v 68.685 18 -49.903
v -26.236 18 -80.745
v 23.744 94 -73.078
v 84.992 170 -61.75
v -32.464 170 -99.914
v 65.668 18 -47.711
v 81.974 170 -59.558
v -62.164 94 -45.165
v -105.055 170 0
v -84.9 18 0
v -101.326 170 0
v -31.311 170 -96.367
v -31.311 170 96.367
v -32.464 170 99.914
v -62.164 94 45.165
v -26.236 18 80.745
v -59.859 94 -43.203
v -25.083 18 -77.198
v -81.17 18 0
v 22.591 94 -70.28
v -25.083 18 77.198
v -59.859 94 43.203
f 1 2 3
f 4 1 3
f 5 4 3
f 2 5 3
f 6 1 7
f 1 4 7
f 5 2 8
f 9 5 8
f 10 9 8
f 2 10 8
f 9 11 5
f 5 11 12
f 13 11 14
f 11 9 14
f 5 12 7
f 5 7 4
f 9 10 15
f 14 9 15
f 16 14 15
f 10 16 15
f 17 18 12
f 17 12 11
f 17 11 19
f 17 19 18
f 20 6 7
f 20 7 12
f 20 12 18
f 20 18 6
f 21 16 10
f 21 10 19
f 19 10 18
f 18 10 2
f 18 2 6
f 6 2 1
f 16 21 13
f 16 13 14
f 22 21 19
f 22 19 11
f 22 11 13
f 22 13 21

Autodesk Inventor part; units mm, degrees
sketch "草图1" plane through (0, 0, 0) normal (0, 1, 0) x (-1, 0, 0)
  line L0 (82.5131, 0) -> (25.498, -78.4746)
  line L1 (25.498, -78.4746) -> (-66.7545, -48.5)
  line L2 (-66.7545, -48.5) -> (-66.7545, 48.5)
  line L3 (-66.7545, 48.5) -> (25.498, 78.4746)
  line L4 (25.498, 78.4746) -> (82.5131, 0)
  point P0 (0, 0)
  point P1 (0, 0)
  dimension "d0" = 97
ref_plane "工作平面1" through (0, 170, 0) normal (0, 1, 0) x (-1, 0, 0)
sketch "草图2" plane through (0, 170, 0) normal (0, 1, 0) x (-1, 0, 0)
  line L0 (105.0554, 0) -> (32.4639, -99.9136)
  line L1 (32.4639, -99.9136) -> (-84.9916, -61.75)
  line L2 (-84.9916, -61.75) -> (-84.9916, 61.75)
  line L3 (-84.9916, 61.75) -> (32.4639, 99.9136)
  line L4 (32.4639, 99.9136) -> (105.0554, 0)
  point P0 (0, 0)
  point P1 (0, 0)
  dimension "d2" = 123.5
loft "放样1" add profiles "草图2", "草图1"
sketch "草图3" plane through (84.9916, 170, 61.75) normal (0, 1, 0) x (1, 0, 0)
  line L0 (-153.2988, 61.75) -> (-106.0997, 126.7141)
  line L1 (-106.0997, 126.7141) -> (-29.7298, 101.9)
  line L2 (-29.7298, 101.9) -> (-29.7298, 21.6)
  line L3 (-29.7298, 21.6) -> (-106.0997, -3.2141)
  line L4 (-106.0997, -3.2141) -> (-153.2988, 61.75)
  point P0 (-84.9916, 61.75)
  point P1 (-84.9916, 61.75)
  dimension "d7" = 80.3
extrude "拉伸1" cut sketch "草图3" against normal blind 164
shell "抽壳1" thickness 3 removed faces 1 at (10.4732, 170, -75.5426)
sketch "草图5" plane through (66.7545, 0, -48.5) normal (0, -1, 0) x (1, 0, 0)
  line L0 (-98.0659, 144.8667) -> (-91.2229, 123.806) projected
  line L1 (-106.5917, 71.5) -> (-123.9122, 81.5)
  line L2 (-107.7408, 69.3836) -> (-125.561, 78.4634)
  arc A0 (-106.5917, 71.5) -> (-107.7408, 69.3836) centre (-66.7545, 48.5) ccw
  arc A1 (-123.9122, 81.5) -> (-125.561, 78.4634) centre (-66.7545, 48.5) ccw
  point P0 (-99.2814, 81.0269)
  dimension "d37" = 132
  dimension "d38" = 92
  dimension "d40" = 3
extrude "拉伸2" add sketch "草图5" along normal blind 3
sketch "草图7" plane through (66.7545, -3, -48.5) normal (0, -1, 0) x (1, 0, 0)
  arc A0 (-100.9392, 79.28) -> (-106.5917, 71.5) centre (-66.7545, 48.5) ccw
  arc A1 (-115.8021, 92.6626) -> (-125.561, 78.4634) centre (-66.7545, 48.5) ccw
  arc A2 (-100.9392, 79.28) -> (-107.7408, 69.3836) centre (-66.7545, 48.5) ccw
  line L0 (-100.9392, 79.28) -> (-115.8021, 92.6626)
  line L1 (-125.561, 78.4634) -> (-107.7408, 69.3836) projected
  line L2 (-107.7408, 69.3836) -> (-125.561, 78.4634)
  dimension "d25" = 92
  dimension "d41" = 15
extrude "拉伸3" add sketch "草图7" along normal blind 3
chamfer "倒角1" distance 1 angle 45 1 edges at (-41.6161, -3, 37.4713)
sketch "草图8" plane through (66.7545, 0, -48.5) normal (0, -1, 0) x (1, 0, 0)
  circle A0 centre (-66.7545, 48.5) radius 15
  dimension "d100" = 30
extrude "拉伸4" add sketch "草图8" along normal blind 30
pattern_circular "环形阵列1" count 10 over 360 about axis through (0, -10, 0) along (0, 1, 0) of "拉伸3", "拉伸2", "倒角1"
sketch "草图9" plane through (64.0591, 3, 46.5417) normal (0, 1, 0) x (1, 0, 0)
  line L0 (-132.3664, 46.5417) -> (-85.1672, 111.5058) projected
  line L1 (-85.1672, -18.4224) -> (-132.3664, 46.5417) projected
  line L2 (-8.7974, 6.3917) -> (-85.1672, -18.4224) projected
  line L3 (-8.7974, 86.6917) -> (-8.7974, 6.3917) projected
  line L4 (-85.1672, 111.5058) -> (-8.7974, 86.6917) projected
  line L5 (-136.0746, 46.5417) -> (-86.3131, -21.9491) projected
  line L6 (-86.3131, -21.9491) -> (-5.7974, 4.2121) projected
  line L7 (-5.7974, 4.2121) -> (-5.7974, 88.8713) projected
  line L8 (-5.7974, 88.8713) -> (-86.3131, 115.0325) projected
  line L9 (-86.3131, 115.0325) -> (-136.0746, 46.5417) projected
  line L10 (-85.1672, -18.4224) -> (-132.3664, 46.5417) projected
  line L11 (-132.3664, 46.5417) -> (-85.1672, 111.5058) projected
  line L12 (-85.1672, 111.5058) -> (-8.7974, 86.6917) projected
  line L13 (-8.7974, 86.6917) -> (-8.7974, 6.3917) projected
  line L14 (-8.7974, 6.3917) -> (-85.1672, -18.4224) projected
  line L15 (-143.2406, 46.5417) -> (-88.5276, 121.8477) projected
  line L16 (-88.5276, -28.7643) -> (-143.2406, 46.5417) projected
  line L17 (0, 0) -> (-88.5276, -28.7643) projected
  line L18 (0, 93.0834) -> (0, 0) projected
  line L19 (-88.5276, 121.8477) -> (0, 93.0834) projected
  line L20 (-145.4076, 46.5417) -> (-89.1972, 123.9087)
  line L21 (-89.1972, 123.9087) -> (1.7532, 94.3571)
  line L22 (1.7532, 94.3571) -> (1.7532, -1.2738)
  line L23 (1.7532, -1.2738) -> (-89.1972, -30.8253)
  line L24 (-89.1972, -30.8253) -> (-145.4076, 46.5417)
  point P0 (-64.0591, 46.5417)
extrude "拉伸5" add sketch "草图9" along normal blind 15 contours L15 L19 L18 L17 L16 | L20 L21 L22 L23 L24
sketch "草图10" plane through (84.9916, 6, 61.75) normal (0, 1, 0) x (1, 0, 0)
  line L0 (-153.2988, 61.75) -> (-106.0997, 126.7141) projected
  line L1 (-106.0997, -3.2141) -> (-153.2988, 61.75) projected
  line L2 (-29.7298, 21.6) -> (-106.0997, -3.2141) projected
  line L3 (-29.7298, 101.9) -> (-29.7298, 21.6) projected
  line L4 (-106.0997, 126.7141) -> (-29.7298, 101.9) projected
  line L5 (-107.2456, 130.2408) -> (-157.007, 61.75) projected
  line L6 (-26.7298, 104.0796) -> (-107.2456, 130.2408) projected
  line L7 (-26.7298, 19.4204) -> (-26.7298, 104.0796) projected
  line L8 (-107.2456, -6.7408) -> (-26.7298, 19.4204) projected
  line L9 (-157.007, 61.75) -> (-107.2456, -6.7408) projected
  line L10 (-166.1621, 61.75) -> (-110.0746, 138.9477) projected
  line L11 (-110.0746, -15.4477) -> (-166.1621, 61.75) projected
  line L12 (-19.3233, 14.0392) -> (-110.0746, -15.4477) projected
  line L13 (-19.3233, 109.4608) -> (-19.3233, 14.0392) projected
  line L14 (-110.0746, 138.9477) -> (-19.3233, 109.4608) projected
  point P0 (-84.9916, 61.75)
sketch "草图11" plane through (64.0591, 18, 46.5417) normal (0, 1, 0) x (1, 0, 0)
  line L0 (-64.0591, 46.5417) -> (2.6954, 46.5417) construction
  line L1 (-86.3131, 115.0325) -> (-136.0746, 46.5417) projected
  line L2 (-5.7974, 88.8713) -> (-86.3131, 115.0325) projected
  line L3 (-5.7974, 4.2121) -> (-5.7974, 88.8713) projected
  line L4 (-86.3131, -21.9491) -> (-5.7974, 4.2121) projected
  line L5 (-136.0746, 46.5417) -> (-86.3131, -21.9491) projected
  line L6 (-145.2296, 46.5417) -> (-89.1422, 123.7394) projected
  line L7 (-89.1422, -30.656) -> (-145.2296, 46.5417) projected
  line L8 (1.6092, -1.1691) -> (-89.1422, -30.656) projected
  line L9 (1.6092, 94.2525) -> (1.6092, -1.1691) projected
  line L10 (-89.1422, 123.7394) -> (1.6092, 94.2525) projected
  circle A0 centre (-2.0908, 11.2121) radius 1.25
  line L11 (-5.7974, 4.2121) -> (1.6092, -1.1691) construction
  line L12 (-5.7974, 4.2121) -> (-5.7974, 88.8713) projected
  line L13 (-86.3131, -21.9491) -> (-5.7974, 4.2121) projected
  line L14 (1.6092, -1.1691) -> (-89.1422, -30.656) projected
  line L15 (1.6092, 94.2525) -> (1.6092, -1.1691) projected
  circle A1 centre (-11.3094, -1.4762) radius 1.25
  line L16 (-2.0941, 7.5215) -> (-0.5941, 7.5215)
  line L17 (-0.5941, 7.5215) -> (-0.5941, 0.4317)
  line L18 (-2.0941, 7.5215) -> (-3.5941, 7.5215)
  line L19 (-3.5941, 7.5215) -> (-3.5941, 2.6113)
  line L20 (-7.8005, -0.3326) -> (-7.3369, -1.7592)
  line L21 (-7.3369, -1.7592) -> (-0.5941, 0.4317)
  line L22 (-7.8005, -0.3326) -> (-8.264, 1.094)
  line L23 (-8.264, 1.094) -> (-3.5941, 2.6113)
  dimension "d63" = 2.5
  dimension "d69" = 3.7
  dimension "d131" = 3.6906
extrude "拉伸7" cut sketch "草图11" against normal blind 3 contours A0 | A1 | L16 L17 L21 L20 L22 L23 L19 L18
extrude "拉伸8" add sketch "草图10" along normal blind 10 and the other way blind 3 contours L10 L14 L13 L12 L11
extrude "拉伸9" cut sketch "草图10" along normal blind 10 and the other way blind 3 contours L10 L14 L13 L12 L11
ref_plane "工作平面2" through (84.9916, 7, 61.75) normal (0, 1, 0) x (1, 0, 0)
sketch "草图12" plane through (84.9916, 7, 61.75) normal (0, 1, 0) x (1, 0, 0)
  line L0 (-107.2456, -6.7408) -> (-26.7298, 19.4204) projected
  line L1 (-60.7054, 8.3811) -> (-61.6324, 11.2342)
  line L2 (-29.7298, 21.6) -> (-106.0997, -3.2141) projected
  line L3 (-89.8404, 2.0689) -> (-88.9133, -0.7843)
  line L4 (-107.2456, -6.7408) -> (-26.7298, 19.4204) projected
  line L5 (-29.7298, 21.6) -> (-106.0997, -3.2141) projected
  line L6 (-63.5345, 10.6162) -> (-62.6075, 7.763)
  line L7 (-65.4366, 9.9982) -> (-64.5096, 7.145)
  line L8 (-67.3388, 9.3801) -> (-66.4117, 6.527)
  line L9 (-69.2409, 8.7621) -> (-68.3138, 5.9089)
  line L10 (-71.143, 8.1441) -> (-70.2159, 5.2909)
  line L11 (-73.0451, 7.526) -> (-72.118, 4.6729)
  line L12 (-74.9472, 6.908) -> (-74.0202, 4.0548)
  line L13 (-76.7905, 6.3091) -> (-75.7638, 3.4883)
  line L14 (-84.134, 3.923) -> (-83.207, 1.0698)
  line L15 (-86.0362, 3.305) -> (-85.1091, 0.4518)
  line L16 (-87.9383, 2.6869) -> (-87.0112, -0.1662)
  line L17 (-80.3298, 5.1591) -> (-79.4028, 2.3059)
  line L18 (-82.2319, 4.541) -> (-81.3049, 1.6879)
  line L19 (-78.4277, 5.7771) -> (-77.5006, 2.9239)
  line L20 (-61.6324, 11.2342) -> (-63.5345, 10.6162)
  line L21 (-62.6075, 7.763) -> (-60.7054, 8.3811)
  line L22 (-66.4117, 6.527) -> (-64.5096, 7.145)
  line L23 (-65.4366, 9.9982) -> (-67.3388, 9.3801)
  line L24 (-70.2159, 5.2909) -> (-68.3138, 5.9089)
  line L25 (-69.2409, 8.7621) -> (-71.143, 8.1441)
  line L26 (-74.0202, 4.0548) -> (-72.118, 4.6729)
  line L27 (-73.0451, 7.526) -> (-74.9472, 6.908)
  line L28 (-76.7905, 6.3091) -> (-78.4277, 5.7771)
  line L29 (-77.5006, 2.9239) -> (-75.7638, 3.4883)
  line L30 (-81.3049, 1.6879) -> (-79.4028, 2.3059)
  line L31 (-80.3298, 5.1591) -> (-82.2319, 4.541)
  line L32 (-84.134, 3.923) -> (-86.0362, 3.305)
  line L33 (-87.9383, 2.6869) -> (-89.8404, 2.0689)
  line L34 (-88.9133, -0.7843) -> (-87.0112, -0.1662)
  line L35 (-85.1091, 0.4518) -> (-83.207, 1.0698)
  line L36 (-58.8033, 8.9991) -> (-59.7303, 11.8523)
  line L37 (-56.9011, 9.6171) -> (-57.8282, 12.4703)
  line L38 (-54.999, 10.2352) -> (-55.9261, 13.0883)
  line L39 (-53.0969, 10.8532) -> (-54.024, 13.7064)
  point P0 (-84.9916, 61.75)
  dimension "d73" = 2
  dimension "d74" = 2
  dimension "d75" = 2
  dimension "d76" = 2
  dimension "d77" = 2
  dimension "d78" = 2
  dimension "d79" = 2
  dimension "d80" = 2
  dimension "d81" = 2
  dimension "d82" = 2
  dimension "d83" = 2
  dimension "d84" = 2
  dimension "d85" = 2
  dimension "d86" = 2
  dimension "d88" = 2
  dimension "d89" = 2
  dimension "d90" = 2
  dimension "d91" = 2
extrude "拉伸10" cut sketch "草图12" along normal blind 7 contours L3 L2 L16 L0 | L15 L2 L14 L0 | L18 L2 L17 L0 | L19 L2 L13 L0 | L12 L2 L11 L0 | L10 L2 L9 L0 | L8 L2 L7 L0 | L6 L2 L1 L0 | L36 L2 L37 L0 | L38 L2 L39 L0
pattern_circular "环形阵列2" count 5 over 360 about axis through (0, 0, 0) along (0, -1, 0) of "拉伸10"
sketch "草图13" plane through (66.7545, 0, -48.5) normal (0, -1, 0) x (1, 0, 0)
  line L0 (1.9326, 98.4258) -> (-1.1068, 96.2175) construction
  line L1 (18.2371, 110.25) -> (0, 97) construction
  line L2 (-16.2555, 104.3138) -> (1.9326, 98.4258)
  line L3 (1.9326, 98.4258) -> (1.9326, 79.28)
  line L4 (-14.6399, 100.6147) -> (-1.1068, 96.2175)
  line L5 (-1.0862, 96.2108) -> (-1.0862, 81.9597)
  line L6 (-1.0862, 81.9597) -> (1.9326, 79.28)
  line L7 (-14.6399, 100.6147) -> (-16.2555, 104.3138)
  line L8 (1.9326, 98.4258) -> (1.9326, 79.28)
  line L9 (1.9326, 79.28) -> (-1.0862, 81.9597)
  line L10 (-1.0862, 0.7892) -> (-1.0862, 96.2108) projected
  line L11 (-1.0862, 81.9597) -> (-1.0862, 96.2108)
  line L12 (-1.0862, 96.2108) -> (-14.6399, 100.6147)
  line L13 (-91.8376, 125.6977) -> (-1.0862, 96.2108) projected
  line L14 (0, 97) -> (-92.2525, 126.9746) projected
  line L15 (-14.6399, 100.6147) -> (-16.2555, 104.3138)
  line L16 (-16.2555, 104.3138) -> (1.9326, 98.4258)
  point P0 (-66.7545, 48.5)
  point P1 (18.2371, 110.25)
extrude "拉伸11" cut sketch "草图13" against normal blind 16
sketch "草图14" plane through (0, -30, 0) normal (0, -1, 0) x (1, 0, 0)
  line L0 (11.4602, -0.9019) -> (-11.5398, -0.9019)
  line L1 (-11.5398, -0.9019) -> (-11.5398, 0.7981)
  line L2 (-11.5398, 0.7981) -> (11.4602, 0.7981)
  line L3 (11.4602, 0.7981) -> (11.4602, -0.9019)
  line L4 (15.9292, -0.0519) -> (-16.622, -0.0519) construction
  line L5 (-0.0398, 4.6584) -> (-0.0398, -5.7431) construction
  point P0 (0, 0)
  dimension "d94" = 23
  dimension "d95" = 1.7
extrude "拉伸12" cut sketch "草图14" along normal blind 10 and the other way blind 54.75
sketch "草图15" plane through (0, -30, 0) normal (0, -1, 0) x (1, 0, 0)
  line L0 (11.4602, 0.7981) -> (-11.5398, 0.7981) projected
  line L1 (9.9602, 0.7981) -> (-10.0398, 0.7981)
  line L2 (-10.0398, 0.7981) -> (-10.0398, 2.5981)
  line L3 (-10.0398, 2.5981) -> (9.9602, 2.5981)
  line L4 (9.9602, 2.5981) -> (9.9602, 0.7981)
  line L5 (11.4602, -0.9019) -> (-11.5398, -0.9019) projected
  line L6 (-0.0398, 30.3943) -> (-0.0398, -31.216) construction
  point P0 (0, 0)
  dimension "d101" = 3.5
  dimension "d102" = 20
extrude "拉伸13" cut sketch "草图15" against normal blind 30
sketch "草图16" plane through (0, -30, 0) normal (0, -1, 0) x (1, 0, 0)
  line L0 (11.4602, 0.7981) -> (-11.5398, 0.7981) projected
  line L1 (-5.5398, 0.7981) -> (5.4602, 0.7981)
  line L2 (5.4602, 0.7981) -> (5.4602, 6.5981)
  line L3 (5.4602, 6.5981) -> (-5.5398, 6.5981)
  line L4 (-5.5398, 6.5981) -> (-5.5398, 0.7981)
  line L5 (11.4602, -0.9019) -> (-11.5398, -0.9019) projected
  line L6 (-0.0398, 25.7819) -> (-0.0398, -22.2478) construction
  point P0 (0, 0)
  dimension "d105" = 7.5
  dimension "d106" = 11
extrude "拉伸14" cut sketch "草图16" against normal blind 6
ref_plane "工作平面3" through (0, -28, 0) normal (0, -1, 0) x (1, 0, 0)
sketch "草图18" plane through (0, -28, 0) normal (0, -1, 0) x (1, 0, 0)
  line L0 (5.4602, 6.5981) -> (5.4602, 2.5981) projected
  line L1 (5.4602, 2.5981) -> (9.9602, 2.5981) projected
  line L2 (9.9602, 2.5981) -> (9.9602, 0.7981) projected
  line L3 (9.9602, 0.7981) -> (11.4602, 0.7981) projected
  line L4 (11.4602, 0.7981) -> (11.4602, -0.9019) projected
  line L5 (11.4602, -0.9019) -> (-11.5398, -0.9019) projected
  line L6 (-11.5398, -0.9019) -> (-11.5398, 0.7981) projected
  line L7 (-11.5398, 0.7981) -> (-10.0398, 0.7981) projected
  line L8 (-10.0398, 0.7981) -> (-10.0398, 2.5981) projected
  line L9 (-10.0398, 2.5981) -> (-5.5398, 2.5981) projected
  line L10 (-5.5398, 2.5981) -> (-5.5398, 6.5981) projected
  line L11 (-5.5398, 6.5981) -> (5.4602, 6.5981) projected
  circle A0 centre (0, 0) radius 15 projected
  line L12 (-12.5398, -1.9019) -> (12.4602, -1.9019)
  line L13 (12.4602, -1.9019) -> (12.4602, 1.7981)
  line L14 (12.4602, 1.7981) -> (10.9602, 1.7981)
  line L15 (10.9602, 1.7981) -> (10.9602, 3.5981)
  line L16 (10.9602, 3.5981) -> (6.4602, 3.5981)
  line L17 (6.4602, 3.5981) -> (6.4602, 7.5981)
  line L18 (6.4602, 7.5981) -> (-6.5398, 7.5981)
  line L19 (-6.5398, 7.5981) -> (-6.5398, 3.5981)
  line L20 (-6.5398, 3.5981) -> (-11.0398, 3.5981)
  line L21 (-11.0398, 3.5981) -> (-11.0398, 1.7981)
  line L22 (-11.0398, 1.7981) -> (-12.5398, 1.7981)
  line L23 (-12.5398, 1.7981) -> (-12.5398, -1.9019)
  circle A1 centre (0, 0) radius 14
  point P0 (0, 0)
  dimension "d110" = 1
  dimension "d111" = 1
extrude "拉伸15" cut sketch "草图18" against normal blind 30 contours A1
sketch "草图19" plane through (66.7545, 0, -48.5) normal (0, -1, 0) x (1, 0, 0)
  line L0 (-60.2943, 56.0981) -> (-73.2943, 56.0981) projected
  line L1 (-73.2943, 52.0981) -> (-77.7943, 52.0981) projected
  line L2 (-60.2943, 56.0981) -> (-73.2943, 56.0981)
  line L3 (-73.2943, 56.0981) -> (-73.2943, 52.0981)
  line L4 (-73.2943, 52.0981) -> (-60.2943, 52.0981)
  line L5 (-60.2943, 52.0981) -> (-60.2943, 56.0981)
  point P0 (-66.7545, 48.5)
extrude "拉伸16" cut sketch "草图19" along normal blind 22 and the other way blind 2
sketch "草图21" plane through (0, -30, 0) normal (0, -1, 0) x (1, 0, 0)
  line L0 (5.4602, 6.5981) -> (5.4602, 2.5981) projected
  line L1 (5.4602, 2.5981) -> (9.9602, 2.5981) projected
  line L2 (9.9602, 2.5981) -> (9.9602, 0.7981) projected
  line L3 (9.9602, 0.7981) -> (11.4602, 0.7981) projected
  line L4 (11.4602, 0.7981) -> (11.4602, -0.9019) projected
  line L5 (11.4602, -0.9019) -> (-11.5398, -0.9019) projected
  line L6 (-11.5398, -0.9019) -> (-11.5398, 0.7981) projected
  line L7 (-11.5398, 0.7981) -> (-10.0398, 0.7981) projected
  line L8 (-10.0398, 0.7981) -> (-10.0398, 2.5981) projected
  line L9 (-10.0398, 2.5981) -> (-5.5398, 2.5981) projected
  line L10 (-5.5398, 2.5981) -> (-5.5398, 6.5981) projected
  line L11 (-5.5398, 6.5981) -> (5.4602, 6.5981) projected
  circle A0 centre (0, 0) radius 15 projected
  point P0 (0, 0)
extrude "拉伸17" add sketch "草图21" along normal blind 3
sketch "草图22" plane through (5.4602, -24, 6.5981) normal (0, 0, -1) x (-1, 0, 0)
  line L0 (9.1141, -4) -> (1.9525, -4)
  line L1 (1.9525, -4) -> (9.1141, -4)
  line L2 (9.1141, -4) -> (9.1141, -9.2971)
  line L3 (9.1141, -9.2971) -> (1.9525, -9.2971)
  line L4 (1.9525, -9.2971) -> (1.9525, -4)
  point P0 (5.4602, 24)
extrude "拉伸18" cut sketch "草图22" against normal blind 10
sketch "草图23" plane through (0, -33, 0) normal (0, -1, 0) x (1, 0, 0)
  line L0 (5.555, -0.8779) -> (-5.9531, -0.8779)
  line L1 (-5.9531, -0.8779) -> (-5.9531, -3.3779)
  line L2 (-5.9531, -3.3779) -> (5.555, -3.3779)
  line L3 (5.555, -3.3779) -> (5.555, -0.8779)
  point P0 (0, 0)
  dimension "d125" = 2.5
extrude "拉伸19" cut sketch "草图23" against normal blind 10
sketch "草图24" plane through (64.0591, 18, 46.5417) normal (0, 1, 0) x (1, 0, 0)
  line L0 (-75.5989, 45.7436) -> (-75.5989, 47.4436) projected
  line L1 (-75.5989, 47.4436) -> (-52.5989, 47.4436) projected
  line L2 (-52.5989, 47.4436) -> (-52.5989, 45.7436) projected
  line L3 (-52.5989, 45.7436) -> (-75.5989, 45.7436) projected
  line L4 (-132.3664, 46.5417) -> (-85.1672, 111.5058) projected
  line L5 (-85.1672, -18.4224) -> (-132.3664, 46.5417) projected
  line L6 (-8.7974, 6.3917) -> (-85.1672, -18.4224) projected
  line L7 (-8.7974, 86.6917) -> (-8.7974, 6.3917) projected
  line L8 (-85.1672, 111.5058) -> (-8.7974, 86.6917) projected
  line L9 (-2.9869, 2.1701) -> (-87.3867, -25.2531)
  line L10 (-87.3867, -25.2531) -> (-139.5486, 46.5417)
  line L11 (-139.5486, 46.5417) -> (-87.3867, 118.3364)
  line L12 (-87.3867, 118.3364) -> (-2.9869, 90.9133)
  line L13 (-2.9869, 90.9133) -> (-2.9869, 2.1701)
  line L14 (36.2149, -26.3117) -> (-102.3604, -71.3375)
  line L15 (-102.3604, -71.3375) -> (-188.0047, 46.5417)
  line L16 (-188.0047, 46.5417) -> (-102.3604, 164.4209)
  line L17 (-102.3604, 164.4209) -> (36.2149, 119.3951)
  line L18 (36.2149, 119.3951) -> (36.2149, -26.3117)
  point P0 (-64.0591, 46.5417)
extrude "拉伸20" cut sketch "草图24" along normal blind 1000 contours L14 L15 L16 L17 L18 keep common part
sketch "草图25" plane through (84.9916, 170, 61.75) normal (0, 1, 0) x (1, 0, 0)
  line L0 (0, 0) -> (-117.4555, -38.1636) projected
  line L1 (-84.9916, 61.75) -> (-117.4555, -38.1636)
  line L2 (-117.4555, -38.1636) -> (-259.2708, 40.5435)
  line L3 (-259.2708, 40.5435) -> (-138.2007, 195.9296)
  line L4 (-138.2007, 195.9296) -> (51.1158, 164.3125)
  line L5 (-117.4555, 161.6636) -> (0, 123.5) projected
  line L6 (51.1158, 164.3125) -> (0, 123.5)
  line L7 (0, 123.5) -> (-84.9916, 61.75)
extrude "拉伸21" cut sketch "草图25" against normal blind 300 keep common part
properties part number "花盆主体" material "尼龙 6/6"
